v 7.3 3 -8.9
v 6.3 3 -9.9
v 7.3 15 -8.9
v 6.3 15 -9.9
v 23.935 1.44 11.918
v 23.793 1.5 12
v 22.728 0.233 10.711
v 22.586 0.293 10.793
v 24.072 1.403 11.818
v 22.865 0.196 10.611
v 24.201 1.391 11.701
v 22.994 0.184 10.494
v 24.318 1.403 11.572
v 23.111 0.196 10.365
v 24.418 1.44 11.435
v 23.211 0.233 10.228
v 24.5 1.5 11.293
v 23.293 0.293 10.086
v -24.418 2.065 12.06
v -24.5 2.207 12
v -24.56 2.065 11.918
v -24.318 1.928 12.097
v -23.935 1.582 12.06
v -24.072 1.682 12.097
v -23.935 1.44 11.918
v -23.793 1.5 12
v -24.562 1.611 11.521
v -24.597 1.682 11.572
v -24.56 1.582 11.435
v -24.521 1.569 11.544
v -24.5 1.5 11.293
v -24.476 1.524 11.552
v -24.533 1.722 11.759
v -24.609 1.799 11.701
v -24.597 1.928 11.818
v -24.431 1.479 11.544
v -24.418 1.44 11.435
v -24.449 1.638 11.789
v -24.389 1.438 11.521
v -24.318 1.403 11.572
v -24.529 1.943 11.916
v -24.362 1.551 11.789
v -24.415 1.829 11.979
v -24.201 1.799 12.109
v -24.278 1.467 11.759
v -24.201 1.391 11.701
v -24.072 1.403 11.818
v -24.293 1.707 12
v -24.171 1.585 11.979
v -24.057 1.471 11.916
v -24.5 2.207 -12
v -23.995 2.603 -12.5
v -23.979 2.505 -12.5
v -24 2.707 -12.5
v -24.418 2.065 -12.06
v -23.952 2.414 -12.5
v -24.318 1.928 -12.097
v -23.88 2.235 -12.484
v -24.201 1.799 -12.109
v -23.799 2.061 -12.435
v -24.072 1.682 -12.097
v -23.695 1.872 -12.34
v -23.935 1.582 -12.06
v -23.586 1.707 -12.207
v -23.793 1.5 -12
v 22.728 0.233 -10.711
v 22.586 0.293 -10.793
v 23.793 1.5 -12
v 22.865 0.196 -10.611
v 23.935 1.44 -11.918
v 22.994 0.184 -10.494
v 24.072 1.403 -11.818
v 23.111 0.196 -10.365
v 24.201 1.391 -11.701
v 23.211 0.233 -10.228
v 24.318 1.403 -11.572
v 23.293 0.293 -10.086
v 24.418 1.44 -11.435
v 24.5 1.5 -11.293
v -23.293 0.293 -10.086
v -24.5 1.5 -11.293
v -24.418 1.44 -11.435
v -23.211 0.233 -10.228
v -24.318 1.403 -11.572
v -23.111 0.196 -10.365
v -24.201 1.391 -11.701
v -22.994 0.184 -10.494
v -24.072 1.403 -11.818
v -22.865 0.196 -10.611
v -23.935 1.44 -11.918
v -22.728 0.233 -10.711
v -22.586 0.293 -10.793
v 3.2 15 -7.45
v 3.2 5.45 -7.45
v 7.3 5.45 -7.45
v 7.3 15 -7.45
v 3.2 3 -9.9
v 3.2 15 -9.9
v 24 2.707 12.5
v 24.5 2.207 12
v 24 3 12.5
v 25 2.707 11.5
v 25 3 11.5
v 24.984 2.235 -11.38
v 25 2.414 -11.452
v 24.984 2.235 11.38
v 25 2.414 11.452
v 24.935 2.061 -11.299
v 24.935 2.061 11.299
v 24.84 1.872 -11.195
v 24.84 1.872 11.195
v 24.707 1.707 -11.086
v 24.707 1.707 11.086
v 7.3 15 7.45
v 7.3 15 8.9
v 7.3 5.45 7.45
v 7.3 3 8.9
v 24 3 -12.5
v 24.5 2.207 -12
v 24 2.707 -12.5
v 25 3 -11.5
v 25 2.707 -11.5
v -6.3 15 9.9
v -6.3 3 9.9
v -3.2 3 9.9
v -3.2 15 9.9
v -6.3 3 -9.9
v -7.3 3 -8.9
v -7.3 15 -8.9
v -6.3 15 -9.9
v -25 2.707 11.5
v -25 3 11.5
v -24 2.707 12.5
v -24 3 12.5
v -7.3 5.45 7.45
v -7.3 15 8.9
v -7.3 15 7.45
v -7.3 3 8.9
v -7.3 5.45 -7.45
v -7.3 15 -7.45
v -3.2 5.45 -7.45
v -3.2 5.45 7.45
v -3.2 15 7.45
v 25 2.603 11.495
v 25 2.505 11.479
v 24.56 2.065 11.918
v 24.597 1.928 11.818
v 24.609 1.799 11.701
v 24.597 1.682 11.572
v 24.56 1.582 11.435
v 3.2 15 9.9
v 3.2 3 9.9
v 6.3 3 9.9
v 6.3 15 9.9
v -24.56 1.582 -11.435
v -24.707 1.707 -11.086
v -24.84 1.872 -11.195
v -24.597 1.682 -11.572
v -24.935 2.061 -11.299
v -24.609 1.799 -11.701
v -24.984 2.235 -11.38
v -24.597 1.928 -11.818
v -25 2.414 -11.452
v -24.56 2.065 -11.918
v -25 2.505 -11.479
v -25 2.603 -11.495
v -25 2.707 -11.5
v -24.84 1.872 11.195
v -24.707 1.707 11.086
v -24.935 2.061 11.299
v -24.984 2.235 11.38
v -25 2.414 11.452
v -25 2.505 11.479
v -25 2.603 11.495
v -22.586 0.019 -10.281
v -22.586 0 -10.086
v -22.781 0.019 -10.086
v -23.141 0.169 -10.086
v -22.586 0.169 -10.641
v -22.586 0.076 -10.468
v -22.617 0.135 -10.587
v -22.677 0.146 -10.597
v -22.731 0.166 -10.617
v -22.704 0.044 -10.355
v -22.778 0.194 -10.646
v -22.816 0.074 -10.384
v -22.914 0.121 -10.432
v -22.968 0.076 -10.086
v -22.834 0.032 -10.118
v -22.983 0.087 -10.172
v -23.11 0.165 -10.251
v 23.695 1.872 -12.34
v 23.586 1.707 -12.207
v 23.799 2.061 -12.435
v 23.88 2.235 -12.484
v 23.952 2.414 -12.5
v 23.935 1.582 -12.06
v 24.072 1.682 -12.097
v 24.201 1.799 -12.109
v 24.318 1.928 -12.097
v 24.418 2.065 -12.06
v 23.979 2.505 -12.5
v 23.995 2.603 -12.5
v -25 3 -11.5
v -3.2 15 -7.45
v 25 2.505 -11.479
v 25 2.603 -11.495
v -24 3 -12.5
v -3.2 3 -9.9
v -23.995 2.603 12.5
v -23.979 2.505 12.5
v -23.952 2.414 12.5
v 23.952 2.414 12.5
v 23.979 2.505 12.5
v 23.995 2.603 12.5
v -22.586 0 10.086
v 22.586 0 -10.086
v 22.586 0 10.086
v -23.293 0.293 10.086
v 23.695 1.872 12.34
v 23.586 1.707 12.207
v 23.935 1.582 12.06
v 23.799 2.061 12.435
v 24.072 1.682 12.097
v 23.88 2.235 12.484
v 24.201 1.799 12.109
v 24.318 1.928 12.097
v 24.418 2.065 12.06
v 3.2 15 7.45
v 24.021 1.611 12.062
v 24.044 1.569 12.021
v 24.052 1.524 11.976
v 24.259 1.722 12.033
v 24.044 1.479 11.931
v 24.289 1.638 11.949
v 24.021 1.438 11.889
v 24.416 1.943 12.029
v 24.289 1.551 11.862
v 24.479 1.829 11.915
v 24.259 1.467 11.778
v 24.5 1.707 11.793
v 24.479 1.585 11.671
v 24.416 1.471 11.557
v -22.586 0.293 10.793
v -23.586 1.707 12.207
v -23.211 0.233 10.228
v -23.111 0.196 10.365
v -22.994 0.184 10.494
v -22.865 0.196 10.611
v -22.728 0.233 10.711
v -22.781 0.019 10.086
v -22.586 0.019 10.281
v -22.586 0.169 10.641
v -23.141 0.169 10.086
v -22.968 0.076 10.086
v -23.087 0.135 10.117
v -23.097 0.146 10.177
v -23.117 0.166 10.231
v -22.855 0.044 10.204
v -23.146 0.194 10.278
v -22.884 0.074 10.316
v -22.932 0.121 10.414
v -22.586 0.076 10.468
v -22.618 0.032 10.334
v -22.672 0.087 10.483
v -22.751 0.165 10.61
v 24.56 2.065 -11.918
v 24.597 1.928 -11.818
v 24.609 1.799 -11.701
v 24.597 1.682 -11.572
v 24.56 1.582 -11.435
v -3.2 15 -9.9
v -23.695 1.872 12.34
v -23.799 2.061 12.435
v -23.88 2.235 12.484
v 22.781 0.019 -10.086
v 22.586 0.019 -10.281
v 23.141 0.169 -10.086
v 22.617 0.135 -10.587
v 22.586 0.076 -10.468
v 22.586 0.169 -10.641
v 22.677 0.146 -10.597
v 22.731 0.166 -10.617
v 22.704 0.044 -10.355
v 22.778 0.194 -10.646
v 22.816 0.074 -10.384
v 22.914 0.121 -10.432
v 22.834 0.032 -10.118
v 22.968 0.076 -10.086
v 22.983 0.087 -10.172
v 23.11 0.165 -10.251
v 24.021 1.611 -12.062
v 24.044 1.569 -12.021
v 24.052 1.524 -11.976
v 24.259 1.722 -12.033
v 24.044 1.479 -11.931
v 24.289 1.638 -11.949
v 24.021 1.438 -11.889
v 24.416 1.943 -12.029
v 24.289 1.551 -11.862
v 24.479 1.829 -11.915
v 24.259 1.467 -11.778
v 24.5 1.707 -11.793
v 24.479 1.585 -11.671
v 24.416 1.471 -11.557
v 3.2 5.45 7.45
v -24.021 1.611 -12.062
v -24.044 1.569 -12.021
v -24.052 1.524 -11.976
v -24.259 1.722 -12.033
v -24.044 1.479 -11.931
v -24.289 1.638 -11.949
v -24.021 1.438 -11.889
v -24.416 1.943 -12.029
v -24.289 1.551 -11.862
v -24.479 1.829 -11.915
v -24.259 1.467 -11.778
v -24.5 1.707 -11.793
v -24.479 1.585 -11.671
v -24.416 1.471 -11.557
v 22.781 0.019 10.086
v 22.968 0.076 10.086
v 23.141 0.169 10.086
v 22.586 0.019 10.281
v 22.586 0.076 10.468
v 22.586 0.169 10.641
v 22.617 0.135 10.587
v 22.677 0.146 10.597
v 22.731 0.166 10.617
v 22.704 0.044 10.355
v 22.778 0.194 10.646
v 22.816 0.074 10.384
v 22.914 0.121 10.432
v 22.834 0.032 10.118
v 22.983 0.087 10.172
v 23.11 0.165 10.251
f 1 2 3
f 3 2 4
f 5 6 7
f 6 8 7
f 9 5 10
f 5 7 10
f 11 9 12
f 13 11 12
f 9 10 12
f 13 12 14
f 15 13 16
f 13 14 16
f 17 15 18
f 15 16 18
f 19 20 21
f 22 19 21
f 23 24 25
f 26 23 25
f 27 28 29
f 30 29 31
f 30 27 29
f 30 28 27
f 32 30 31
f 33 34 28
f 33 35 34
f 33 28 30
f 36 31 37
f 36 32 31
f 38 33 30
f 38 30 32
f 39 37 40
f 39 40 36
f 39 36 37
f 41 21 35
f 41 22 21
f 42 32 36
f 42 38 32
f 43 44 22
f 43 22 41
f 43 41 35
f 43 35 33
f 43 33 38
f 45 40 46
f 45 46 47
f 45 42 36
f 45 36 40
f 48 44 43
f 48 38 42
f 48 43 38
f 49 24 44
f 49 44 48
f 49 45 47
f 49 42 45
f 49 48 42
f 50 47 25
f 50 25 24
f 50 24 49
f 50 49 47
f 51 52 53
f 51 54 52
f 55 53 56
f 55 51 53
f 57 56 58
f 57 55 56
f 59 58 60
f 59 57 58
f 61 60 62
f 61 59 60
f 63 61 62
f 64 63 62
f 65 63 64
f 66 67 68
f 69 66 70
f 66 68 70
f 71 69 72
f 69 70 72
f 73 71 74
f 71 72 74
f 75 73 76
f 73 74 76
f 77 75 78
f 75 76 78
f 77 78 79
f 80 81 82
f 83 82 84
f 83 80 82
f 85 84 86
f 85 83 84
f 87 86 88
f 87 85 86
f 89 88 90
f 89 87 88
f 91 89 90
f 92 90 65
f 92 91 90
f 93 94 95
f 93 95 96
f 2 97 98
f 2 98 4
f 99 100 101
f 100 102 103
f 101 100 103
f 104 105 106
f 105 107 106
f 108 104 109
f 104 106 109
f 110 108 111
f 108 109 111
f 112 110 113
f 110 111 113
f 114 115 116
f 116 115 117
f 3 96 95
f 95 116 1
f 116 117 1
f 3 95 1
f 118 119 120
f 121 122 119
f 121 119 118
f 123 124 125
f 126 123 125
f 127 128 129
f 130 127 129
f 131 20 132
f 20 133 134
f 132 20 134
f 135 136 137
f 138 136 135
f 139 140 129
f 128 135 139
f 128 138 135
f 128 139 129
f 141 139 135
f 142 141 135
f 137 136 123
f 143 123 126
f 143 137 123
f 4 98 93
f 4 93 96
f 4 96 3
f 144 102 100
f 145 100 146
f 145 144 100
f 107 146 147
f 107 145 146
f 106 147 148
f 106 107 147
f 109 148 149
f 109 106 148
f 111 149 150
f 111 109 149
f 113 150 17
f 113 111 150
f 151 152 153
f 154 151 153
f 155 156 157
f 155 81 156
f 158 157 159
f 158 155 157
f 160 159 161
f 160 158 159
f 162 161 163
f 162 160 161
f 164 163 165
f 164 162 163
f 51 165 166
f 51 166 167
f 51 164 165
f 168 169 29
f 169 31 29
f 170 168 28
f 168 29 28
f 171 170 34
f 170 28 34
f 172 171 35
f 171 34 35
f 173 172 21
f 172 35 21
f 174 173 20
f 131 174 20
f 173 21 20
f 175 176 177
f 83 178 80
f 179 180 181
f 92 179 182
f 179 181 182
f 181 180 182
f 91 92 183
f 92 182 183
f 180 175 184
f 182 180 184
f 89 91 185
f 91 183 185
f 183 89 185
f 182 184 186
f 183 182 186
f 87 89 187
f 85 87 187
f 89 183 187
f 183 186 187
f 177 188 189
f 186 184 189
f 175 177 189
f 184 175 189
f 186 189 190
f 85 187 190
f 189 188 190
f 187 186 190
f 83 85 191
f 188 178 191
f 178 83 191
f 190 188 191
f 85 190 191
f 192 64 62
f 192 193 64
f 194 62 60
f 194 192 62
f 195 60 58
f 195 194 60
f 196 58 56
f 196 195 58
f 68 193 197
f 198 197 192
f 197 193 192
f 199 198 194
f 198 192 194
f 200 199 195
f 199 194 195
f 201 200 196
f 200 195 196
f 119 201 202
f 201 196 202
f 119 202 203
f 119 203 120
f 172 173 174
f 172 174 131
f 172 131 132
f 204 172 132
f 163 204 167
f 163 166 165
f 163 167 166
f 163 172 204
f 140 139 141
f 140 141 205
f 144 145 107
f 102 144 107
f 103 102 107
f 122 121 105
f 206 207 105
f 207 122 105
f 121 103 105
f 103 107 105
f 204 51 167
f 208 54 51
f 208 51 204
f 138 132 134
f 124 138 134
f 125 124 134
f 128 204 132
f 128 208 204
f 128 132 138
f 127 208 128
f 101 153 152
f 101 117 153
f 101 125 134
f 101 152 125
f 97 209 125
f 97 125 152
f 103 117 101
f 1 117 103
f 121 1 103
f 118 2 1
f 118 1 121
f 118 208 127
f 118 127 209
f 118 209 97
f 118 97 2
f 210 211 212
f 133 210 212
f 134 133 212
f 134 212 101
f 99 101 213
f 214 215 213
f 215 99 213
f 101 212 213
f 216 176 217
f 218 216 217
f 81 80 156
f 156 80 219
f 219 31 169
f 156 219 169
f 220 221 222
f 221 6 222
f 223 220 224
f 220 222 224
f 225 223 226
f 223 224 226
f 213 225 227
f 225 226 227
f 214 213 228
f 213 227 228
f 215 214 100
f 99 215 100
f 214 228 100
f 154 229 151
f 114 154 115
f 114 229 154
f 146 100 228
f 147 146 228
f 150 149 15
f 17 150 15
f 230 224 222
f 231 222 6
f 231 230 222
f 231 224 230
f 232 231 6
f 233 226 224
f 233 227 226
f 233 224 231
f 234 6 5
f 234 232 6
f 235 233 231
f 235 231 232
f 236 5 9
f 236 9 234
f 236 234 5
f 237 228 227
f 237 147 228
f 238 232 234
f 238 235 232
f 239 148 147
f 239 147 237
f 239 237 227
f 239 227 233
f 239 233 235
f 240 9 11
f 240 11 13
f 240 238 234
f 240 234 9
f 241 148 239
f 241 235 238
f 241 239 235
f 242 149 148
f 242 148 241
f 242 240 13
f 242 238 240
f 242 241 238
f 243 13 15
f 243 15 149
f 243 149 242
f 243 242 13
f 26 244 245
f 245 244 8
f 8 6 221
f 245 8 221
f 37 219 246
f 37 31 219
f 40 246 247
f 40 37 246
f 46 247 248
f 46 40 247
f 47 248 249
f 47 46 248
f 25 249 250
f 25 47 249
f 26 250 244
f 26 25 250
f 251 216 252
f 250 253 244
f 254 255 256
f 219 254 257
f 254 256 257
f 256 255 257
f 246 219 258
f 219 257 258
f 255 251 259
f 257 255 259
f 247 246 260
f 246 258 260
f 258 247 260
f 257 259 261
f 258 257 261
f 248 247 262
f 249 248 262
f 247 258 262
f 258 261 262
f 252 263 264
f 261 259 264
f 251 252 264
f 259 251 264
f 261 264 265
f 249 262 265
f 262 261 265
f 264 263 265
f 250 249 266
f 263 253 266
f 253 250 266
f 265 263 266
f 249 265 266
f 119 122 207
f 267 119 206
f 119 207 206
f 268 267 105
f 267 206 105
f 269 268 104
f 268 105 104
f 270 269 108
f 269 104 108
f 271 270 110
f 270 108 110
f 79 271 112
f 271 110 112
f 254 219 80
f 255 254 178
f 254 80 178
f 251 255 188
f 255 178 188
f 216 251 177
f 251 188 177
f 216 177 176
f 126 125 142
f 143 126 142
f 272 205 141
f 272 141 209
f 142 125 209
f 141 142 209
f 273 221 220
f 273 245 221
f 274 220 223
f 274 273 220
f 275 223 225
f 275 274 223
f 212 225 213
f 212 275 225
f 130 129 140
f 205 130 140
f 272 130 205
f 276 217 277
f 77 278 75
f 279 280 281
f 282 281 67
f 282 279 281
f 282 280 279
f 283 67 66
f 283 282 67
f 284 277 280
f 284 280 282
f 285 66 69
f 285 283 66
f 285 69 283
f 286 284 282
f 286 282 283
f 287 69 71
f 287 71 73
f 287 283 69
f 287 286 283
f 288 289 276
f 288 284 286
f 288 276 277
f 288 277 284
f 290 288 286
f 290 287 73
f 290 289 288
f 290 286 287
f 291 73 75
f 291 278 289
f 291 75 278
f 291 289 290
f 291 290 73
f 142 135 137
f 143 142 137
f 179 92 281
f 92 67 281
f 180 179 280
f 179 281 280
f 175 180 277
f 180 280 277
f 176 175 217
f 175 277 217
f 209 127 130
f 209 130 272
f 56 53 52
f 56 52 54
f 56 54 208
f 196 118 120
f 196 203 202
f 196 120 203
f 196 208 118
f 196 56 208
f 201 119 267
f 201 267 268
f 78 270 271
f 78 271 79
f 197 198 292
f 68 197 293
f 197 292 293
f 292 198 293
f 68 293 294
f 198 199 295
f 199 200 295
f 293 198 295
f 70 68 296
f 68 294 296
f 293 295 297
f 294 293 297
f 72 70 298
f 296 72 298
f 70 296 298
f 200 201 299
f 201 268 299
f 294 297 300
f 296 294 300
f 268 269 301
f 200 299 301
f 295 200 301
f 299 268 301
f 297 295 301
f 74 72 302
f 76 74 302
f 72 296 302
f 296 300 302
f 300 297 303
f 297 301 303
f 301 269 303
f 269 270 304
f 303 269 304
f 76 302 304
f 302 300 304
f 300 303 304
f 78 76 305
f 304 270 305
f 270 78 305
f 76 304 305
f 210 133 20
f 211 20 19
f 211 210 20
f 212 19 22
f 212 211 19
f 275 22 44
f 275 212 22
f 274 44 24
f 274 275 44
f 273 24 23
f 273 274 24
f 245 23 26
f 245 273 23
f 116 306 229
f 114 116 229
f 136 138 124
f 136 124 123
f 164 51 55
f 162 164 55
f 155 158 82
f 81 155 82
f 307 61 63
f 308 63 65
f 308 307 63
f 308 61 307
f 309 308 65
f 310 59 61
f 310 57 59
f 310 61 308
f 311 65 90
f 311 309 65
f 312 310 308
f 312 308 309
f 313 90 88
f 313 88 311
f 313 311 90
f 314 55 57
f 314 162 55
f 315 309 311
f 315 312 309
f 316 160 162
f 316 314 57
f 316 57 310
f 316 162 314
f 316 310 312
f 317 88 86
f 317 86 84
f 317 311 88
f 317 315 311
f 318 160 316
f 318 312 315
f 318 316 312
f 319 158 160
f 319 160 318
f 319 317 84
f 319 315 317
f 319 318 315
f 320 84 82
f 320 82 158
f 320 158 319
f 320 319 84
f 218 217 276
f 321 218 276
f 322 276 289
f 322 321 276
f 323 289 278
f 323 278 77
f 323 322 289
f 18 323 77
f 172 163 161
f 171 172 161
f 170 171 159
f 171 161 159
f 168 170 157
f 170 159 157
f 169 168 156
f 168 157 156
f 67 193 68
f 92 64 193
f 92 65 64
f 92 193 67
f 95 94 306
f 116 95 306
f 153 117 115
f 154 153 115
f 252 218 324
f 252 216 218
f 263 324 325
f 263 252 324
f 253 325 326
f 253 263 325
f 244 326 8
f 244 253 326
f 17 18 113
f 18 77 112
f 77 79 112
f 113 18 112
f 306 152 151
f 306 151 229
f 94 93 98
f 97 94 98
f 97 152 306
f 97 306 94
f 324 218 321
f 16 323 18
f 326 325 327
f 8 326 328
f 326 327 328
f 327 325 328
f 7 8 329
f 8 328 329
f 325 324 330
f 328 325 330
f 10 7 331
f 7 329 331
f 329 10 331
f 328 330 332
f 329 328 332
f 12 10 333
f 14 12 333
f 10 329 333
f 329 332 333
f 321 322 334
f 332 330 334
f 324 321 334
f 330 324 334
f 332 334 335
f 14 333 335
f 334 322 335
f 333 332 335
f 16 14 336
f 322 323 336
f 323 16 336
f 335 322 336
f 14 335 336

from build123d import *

# Parameters (mm, degrees)
SKETCH1_W           = 50
SKETCH1_H           = 25
BOSS_EXTRUDE1_DEPTH = 3
SKETCH2_W           = 4.1
SKETCH2_H           = 19.8
BOSS_EXTRUDE2_DEPTH = 12
CHAMFER3_SIZE       = 1
CHAMFER1_SIZE       = 2
FILLET1_R           = 1
SKETCH3_W           = 7.45
SKETCH3_H           = 9.55
CUT_EXTRUDE1_DEPTH  = 38.743078836
CHAMFER2_SIZE       = 1


with BuildPart() as part:
    # Sketch1 → Boss-Extrude1 (new body)
    with BuildSketch(Plane(origin=(0, 0, 0), x_dir=(1, 0, 0), z_dir=(0, 1, 0))):
        Rectangle(SKETCH1_W, SKETCH1_H)
    extrude(amount=BOSS_EXTRUDE1_DEPTH)

    # Sketch2 → Boss-Extrude2 (add)
    with BuildSketch(Plane(origin=(0, 3, 0), x_dir=(1, 0, 0), z_dir=(0, 1, 0))):
        with Locations((-5.25, 0)):
            Rectangle(SKETCH2_W, SKETCH2_H)
        with Locations((5.25, 0)):
            Rectangle(SKETCH2_W, SKETCH2_H)
    extrude(amount=BOSS_EXTRUDE2_DEPTH)

    # Chamfer3
    chamfer3_edges = [part.edges().sort_by_distance(p)[0] for p in [
        (25, 1.5, 12.5),
        (-25, 1.5, 12.5),
        (-25, 1.5, -12.5),
        (25, 1.5, -12.5),
    ]]
    chamfer(chamfer3_edges, length=CHAMFER3_SIZE)

    # Chamfer1
    # the kernel refuses this chamfer: 2 mm, written as the material it takes off along each edge
    with BuildSketch(Plane(origin=(-29.143365976, 0, -12.5), x_dir=(0, 0.9996219169112968, -0.027495876610586494), z_dir=(1, 0, 0))) as chamfer1_piece_1:
        Polygon((CHAMFER1_SIZE * 0.999621916911, CHAMFER1_SIZE * 0.0274958766106), (-CHAMFER1_SIZE * 0.0274958766106, CHAMFER1_SIZE * 0.999621916911), (0, 0), align=None)
    extrude(amount=58.286731952, mode=Mode.SUBTRACT)
    with BuildSketch(Plane(origin=(-25, 0, 16.643365976), x_dir=(0.9996219169112968, -0.02749587661058639, 0), z_dir=(0, 0, -1)), Plane(origin=(25, 0, -16.643365976), x_dir=(-0.9996219169112968, -0.02749587661058639, 0), z_dir=(0, 0, 1))) as chamfer1_piece_2:
        Polygon((CHAMFER1_SIZE * 0.999621916911, -CHAMFER1_SIZE * 0.0274958766106), (-CHAMFER1_SIZE * 0.0274958766106, -CHAMFER1_SIZE * 0.999621916911), (0, 0), align=None)
    extrude(amount=33.286731952, mode=Mode.SUBTRACT)
    with BuildSketch(Plane(origin=(29.143365976, 0, 12.5), x_dir=(0, -0.027495876610586365, -0.9996219169112968), z_dir=(-1, 0, 0))) as chamfer1_piece_3:
        Polygon((CHAMFER1_SIZE * 0.999621916911, -CHAMFER1_SIZE * 0.0274958766106), (-CHAMFER1_SIZE * 0.0274958766106, -CHAMFER1_SIZE * 0.999621916911), (0, 0), align=None)
    extrude(amount=58.286731952, mode=Mode.SUBTRACT)

    # Fillet1
    fillet1_edges = [part.edges().sort_by_distance(p)[0] for p in [
        (0, 2, -12.5),
        (-24.75, 1.75, -11.75),
        (-24.25, 1.75, -12.25),
        (23, 0, 0),
        (0, 0, 10.5),
        (-23, 0, 0),
        (0, 0, -10.5),
        (24.75, 1.75, -11.75),
        (24.25, 1.75, -12.25),
        (-25, 2, 0),
        (-24.25, 1.75, 12.25),
        (-24.75, 1.75, 11.75),
        (0, 2, 12.5),
        (24.75, 1.75, 11.75),
        (24.25, 1.75, 12.25),
        (25, 2, 0),
        (23.75, 0.75, 11.25),
        (-23.75, 0.75, 11.25),
        (23.75, 0.75, -11.25),
        (-23.75, 0.75, -11.25),
    ]]
    fillet(fillet1_edges, radius=FILLET1_R)

    # Sketch3 → Cut-Extrude1 (cut, through all)
    with BuildSketch(Plane.ZY.offset(7.3)):
        with Locations((-3.725, 10.225)):
            Rectangle(SKETCH3_W, SKETCH3_H)
        with Locations((3.725, 10.225)):
            Rectangle(SKETCH3_W, SKETCH3_H)
    extrude(amount=-CUT_EXTRUDE1_DEPTH, mode=Mode.SUBTRACT)

    # Chamfer2
    chamfer2_edges = [part.edges().sort_by_distance(p)[0] for p in [
        (-7.3, 9, -9.9),
        (-7.3, 9, 9.9),
        (7.3, 9, 9.9),
        (7.3, 9, -9.9),
    ]]
    chamfer(chamfer2_edges, length=CHAMFER2_SIZE)


solid = part.part
